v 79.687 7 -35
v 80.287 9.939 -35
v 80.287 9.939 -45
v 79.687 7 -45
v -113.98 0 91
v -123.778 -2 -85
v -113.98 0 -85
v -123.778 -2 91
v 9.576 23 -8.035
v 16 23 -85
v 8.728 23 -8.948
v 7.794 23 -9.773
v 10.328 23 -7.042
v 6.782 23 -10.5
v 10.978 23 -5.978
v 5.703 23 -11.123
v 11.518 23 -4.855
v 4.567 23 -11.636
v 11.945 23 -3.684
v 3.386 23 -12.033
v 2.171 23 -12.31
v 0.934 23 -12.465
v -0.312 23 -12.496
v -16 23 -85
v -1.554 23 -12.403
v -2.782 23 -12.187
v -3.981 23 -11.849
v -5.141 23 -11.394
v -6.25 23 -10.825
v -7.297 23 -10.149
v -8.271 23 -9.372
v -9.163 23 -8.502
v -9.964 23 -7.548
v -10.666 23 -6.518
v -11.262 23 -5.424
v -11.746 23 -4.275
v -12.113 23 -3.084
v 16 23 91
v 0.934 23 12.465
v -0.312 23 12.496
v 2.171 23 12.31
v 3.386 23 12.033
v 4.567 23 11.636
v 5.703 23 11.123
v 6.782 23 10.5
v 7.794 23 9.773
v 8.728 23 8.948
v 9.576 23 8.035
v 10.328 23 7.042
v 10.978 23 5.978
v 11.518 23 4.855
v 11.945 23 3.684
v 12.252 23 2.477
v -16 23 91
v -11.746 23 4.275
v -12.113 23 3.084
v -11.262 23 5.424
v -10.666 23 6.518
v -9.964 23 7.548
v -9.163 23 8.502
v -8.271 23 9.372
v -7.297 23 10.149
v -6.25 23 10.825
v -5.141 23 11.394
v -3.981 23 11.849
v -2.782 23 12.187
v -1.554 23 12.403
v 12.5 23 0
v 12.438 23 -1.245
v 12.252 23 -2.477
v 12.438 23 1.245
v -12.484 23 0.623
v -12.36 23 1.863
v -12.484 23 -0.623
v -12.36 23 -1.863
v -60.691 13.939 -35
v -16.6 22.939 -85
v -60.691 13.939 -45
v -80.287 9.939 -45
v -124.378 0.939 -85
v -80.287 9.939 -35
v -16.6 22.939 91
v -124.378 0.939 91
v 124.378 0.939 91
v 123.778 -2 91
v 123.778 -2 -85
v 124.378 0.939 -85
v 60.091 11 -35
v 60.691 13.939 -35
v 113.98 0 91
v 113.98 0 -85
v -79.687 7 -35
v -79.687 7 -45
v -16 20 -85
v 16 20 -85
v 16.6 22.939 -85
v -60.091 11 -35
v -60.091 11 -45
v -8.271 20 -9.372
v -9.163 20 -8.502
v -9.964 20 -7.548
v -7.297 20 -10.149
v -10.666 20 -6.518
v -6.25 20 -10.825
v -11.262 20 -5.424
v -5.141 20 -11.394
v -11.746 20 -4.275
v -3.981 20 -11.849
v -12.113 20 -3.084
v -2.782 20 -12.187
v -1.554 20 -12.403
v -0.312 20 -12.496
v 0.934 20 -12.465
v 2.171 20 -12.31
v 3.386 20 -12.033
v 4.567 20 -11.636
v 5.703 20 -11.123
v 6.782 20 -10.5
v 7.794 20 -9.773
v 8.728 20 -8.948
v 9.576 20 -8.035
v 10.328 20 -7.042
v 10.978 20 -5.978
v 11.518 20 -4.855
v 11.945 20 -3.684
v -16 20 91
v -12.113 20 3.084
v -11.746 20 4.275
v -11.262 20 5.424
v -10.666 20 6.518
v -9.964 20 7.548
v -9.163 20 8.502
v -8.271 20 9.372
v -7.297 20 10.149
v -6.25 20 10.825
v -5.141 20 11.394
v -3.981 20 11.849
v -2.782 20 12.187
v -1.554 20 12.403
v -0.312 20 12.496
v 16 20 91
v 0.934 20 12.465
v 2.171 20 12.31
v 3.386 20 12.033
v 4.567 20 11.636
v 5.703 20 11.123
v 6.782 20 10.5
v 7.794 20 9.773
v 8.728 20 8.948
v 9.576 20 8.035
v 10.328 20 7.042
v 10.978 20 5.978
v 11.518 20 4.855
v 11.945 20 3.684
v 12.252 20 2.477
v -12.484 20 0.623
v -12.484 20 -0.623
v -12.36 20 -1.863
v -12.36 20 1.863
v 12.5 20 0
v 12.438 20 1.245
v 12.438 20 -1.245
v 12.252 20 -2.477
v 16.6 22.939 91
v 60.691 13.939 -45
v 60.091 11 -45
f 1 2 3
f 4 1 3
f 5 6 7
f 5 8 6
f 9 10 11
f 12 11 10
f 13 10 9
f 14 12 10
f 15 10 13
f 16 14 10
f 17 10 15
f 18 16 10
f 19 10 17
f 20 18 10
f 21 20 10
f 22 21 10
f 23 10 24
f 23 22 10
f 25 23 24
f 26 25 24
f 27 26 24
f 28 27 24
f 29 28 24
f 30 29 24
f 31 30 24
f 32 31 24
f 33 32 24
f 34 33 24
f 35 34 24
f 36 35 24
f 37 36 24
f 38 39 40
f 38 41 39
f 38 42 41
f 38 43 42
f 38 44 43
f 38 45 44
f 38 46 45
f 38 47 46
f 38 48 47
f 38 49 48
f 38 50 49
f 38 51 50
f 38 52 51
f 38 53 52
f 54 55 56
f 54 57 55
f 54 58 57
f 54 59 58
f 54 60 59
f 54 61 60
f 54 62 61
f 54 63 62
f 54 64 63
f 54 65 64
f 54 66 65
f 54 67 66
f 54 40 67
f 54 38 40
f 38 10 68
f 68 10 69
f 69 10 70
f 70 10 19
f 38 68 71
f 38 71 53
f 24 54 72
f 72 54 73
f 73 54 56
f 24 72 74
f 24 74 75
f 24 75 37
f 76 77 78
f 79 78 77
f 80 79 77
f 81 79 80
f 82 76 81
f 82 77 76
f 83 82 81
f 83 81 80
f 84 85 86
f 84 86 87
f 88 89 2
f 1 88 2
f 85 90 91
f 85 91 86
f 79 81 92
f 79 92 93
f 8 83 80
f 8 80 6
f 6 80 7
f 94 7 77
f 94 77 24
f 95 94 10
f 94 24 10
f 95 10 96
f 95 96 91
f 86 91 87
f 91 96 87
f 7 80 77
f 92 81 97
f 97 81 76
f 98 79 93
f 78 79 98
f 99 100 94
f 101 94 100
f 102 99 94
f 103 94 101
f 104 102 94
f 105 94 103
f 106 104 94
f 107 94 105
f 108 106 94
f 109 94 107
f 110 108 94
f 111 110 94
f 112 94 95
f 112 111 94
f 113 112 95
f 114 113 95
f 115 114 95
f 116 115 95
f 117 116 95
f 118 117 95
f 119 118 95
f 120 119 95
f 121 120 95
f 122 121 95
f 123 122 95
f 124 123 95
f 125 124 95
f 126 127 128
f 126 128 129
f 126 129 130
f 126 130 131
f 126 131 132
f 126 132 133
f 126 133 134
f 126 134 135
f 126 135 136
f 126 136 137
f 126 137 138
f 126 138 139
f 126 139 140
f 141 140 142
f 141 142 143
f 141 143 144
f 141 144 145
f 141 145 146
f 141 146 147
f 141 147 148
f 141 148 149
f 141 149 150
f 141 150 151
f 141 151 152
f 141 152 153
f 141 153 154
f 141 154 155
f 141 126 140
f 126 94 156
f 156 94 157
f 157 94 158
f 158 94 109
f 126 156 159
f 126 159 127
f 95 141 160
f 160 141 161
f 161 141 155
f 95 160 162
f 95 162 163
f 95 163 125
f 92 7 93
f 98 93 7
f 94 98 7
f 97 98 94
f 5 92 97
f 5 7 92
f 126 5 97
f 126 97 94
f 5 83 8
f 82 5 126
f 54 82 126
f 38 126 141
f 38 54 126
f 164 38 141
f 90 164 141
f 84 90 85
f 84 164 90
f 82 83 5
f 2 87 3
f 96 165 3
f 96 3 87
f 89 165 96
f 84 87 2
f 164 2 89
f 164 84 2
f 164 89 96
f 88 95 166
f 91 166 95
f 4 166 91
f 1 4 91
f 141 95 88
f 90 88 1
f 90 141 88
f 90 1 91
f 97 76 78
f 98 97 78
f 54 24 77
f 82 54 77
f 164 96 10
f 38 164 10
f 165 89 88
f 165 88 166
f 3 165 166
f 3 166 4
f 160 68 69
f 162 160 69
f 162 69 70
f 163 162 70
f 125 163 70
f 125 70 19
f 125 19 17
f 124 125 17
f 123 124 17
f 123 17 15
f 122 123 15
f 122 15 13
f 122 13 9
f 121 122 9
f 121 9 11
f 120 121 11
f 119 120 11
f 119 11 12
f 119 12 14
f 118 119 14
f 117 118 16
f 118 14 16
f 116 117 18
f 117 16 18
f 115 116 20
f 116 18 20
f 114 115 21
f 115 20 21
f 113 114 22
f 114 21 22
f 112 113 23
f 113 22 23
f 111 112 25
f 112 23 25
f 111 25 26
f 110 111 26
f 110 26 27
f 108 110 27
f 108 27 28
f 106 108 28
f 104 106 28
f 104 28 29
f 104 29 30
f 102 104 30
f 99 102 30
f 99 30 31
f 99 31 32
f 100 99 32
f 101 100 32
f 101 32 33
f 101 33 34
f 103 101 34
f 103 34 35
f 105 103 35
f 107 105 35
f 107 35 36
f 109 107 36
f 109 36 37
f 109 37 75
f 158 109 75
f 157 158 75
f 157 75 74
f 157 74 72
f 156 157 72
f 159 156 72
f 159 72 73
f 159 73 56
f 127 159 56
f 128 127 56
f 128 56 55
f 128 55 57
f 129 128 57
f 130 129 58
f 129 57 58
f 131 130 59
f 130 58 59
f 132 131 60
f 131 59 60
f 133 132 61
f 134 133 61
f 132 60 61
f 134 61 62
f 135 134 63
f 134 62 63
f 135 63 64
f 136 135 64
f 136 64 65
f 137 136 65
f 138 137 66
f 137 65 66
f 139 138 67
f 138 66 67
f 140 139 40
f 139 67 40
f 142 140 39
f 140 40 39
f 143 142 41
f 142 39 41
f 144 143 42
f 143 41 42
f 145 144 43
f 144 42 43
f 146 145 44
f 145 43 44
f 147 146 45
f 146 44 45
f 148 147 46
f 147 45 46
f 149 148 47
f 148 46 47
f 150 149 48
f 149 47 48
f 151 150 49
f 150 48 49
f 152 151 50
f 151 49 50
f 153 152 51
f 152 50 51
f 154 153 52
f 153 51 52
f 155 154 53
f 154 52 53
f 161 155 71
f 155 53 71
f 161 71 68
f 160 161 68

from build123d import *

# Parameters (mm, degrees)
BOSS_EXTRUDE1_DEPTH      = 3
BOSS_EXTRUDE2_DEPTH      = 88
BOSS_EXTRUDE2_DEPTH_BACK = 88
CUT_EXTRUDE1_DEPTH       = 50
SKETCH4_R                = 12.5
CUT_EXTRUDE2_DEPTH       = 25.999792682
SKETCH5_W                = 20
SKETCH5_H                = 10
CUT_EXTRUDE3_DEPTH       = 53.630567568
SKETCH6_W                = 20
SKETCH6_H                = 10
CUT_EXTRUDE4_DEPTH       = 53.630567568


with BuildPart() as part:
    # Sketch1 → Boss-Extrude1 (new body)
    with BuildSketch(Plane.XY):
        Polygon((-16, 19.999811529), (16, 19.999811529), (113.979628183, 0), (113.979628183, -10), (-113.979628183, -10), (-113.979628183, 0), align=None)
    extrude(amount=BOSS_EXTRUDE1_DEPTH)

    # Sketch2 → Boss-Extrude2 (add, two sides)
    with BuildSketch(Plane.XY.offset(3)) as boss_extrude2_sk:
        Polygon((-113.979628183, 0), (-16, 19.999811529), (16, 19.999811529), (113.979628183, 0), (123.777591001, -1.999981153), (124.377585347, 0.939407693), (16.599994346, 22.939200374), (16, 22.999811529), (-16, 22.999811529), (-16.599994346, 22.939200374), (-124.377585347, 0.939407693), (-123.777591001, -1.999981153), align=None)
    extrude(amount=BOSS_EXTRUDE2_DEPTH)
    extrude(boss_extrude2_sk.sketch, amount=-BOSS_EXTRUDE2_DEPTH_BACK)

    # Sketch3 → Cut-Extrude1 (cut)
    with BuildSketch(Plane.XY.offset(3)):
        Polygon((113.979628183, 0), (16, 19.999811529), (-16, 19.999811529), (-113.979628183, 0), (-113.979628183, -10), (113.979628183, -10), align=None)
    extrude(amount=-CUT_EXTRUDE1_DEPTH, mode=Mode.SUBTRACT)

    # Sketch4 → Cut-Extrude2 (cut, through all)
    with BuildSketch(Plane(origin=(0, 22.999811529, 0), x_dir=(1, 0, 0), z_dir=(0, 1, 0))):
        Circle(SKETCH4_R)
    extrude(amount=-CUT_EXTRUDE2_DEPTH, mode=Mode.SUBTRACT)

    # Sketch5 → Cut-Extrude3 (cut, through all)
    with BuildSketch(Plane(origin=(-5.159093546, 25.274541546, 0), x_dir=(0.979796282, 0.199998115, 0), z_dir=(-0.199998115, 0.979796282, 0))):
        with Locations((-66.676815897, 40)):
            Rectangle(SKETCH5_W, SKETCH5_H)
    extrude(amount=-CUT_EXTRUDE3_DEPTH, mode=Mode.SUBTRACT)

    # Sketch6 → Cut-Extrude4 (cut, through all)
    with BuildSketch(Plane(origin=(5.159093546, 25.274541546, 0), x_dir=(0.979796282, -0.199998115, 0), z_dir=(0.199998115, 0.979796282, 0))):
        with Locations((66.676815897, 40)):
            Rectangle(SKETCH6_W, SKETCH6_H)
    extrude(amount=-CUT_EXTRUDE4_DEPTH, mode=Mode.SUBTRACT)


solid = part.part
